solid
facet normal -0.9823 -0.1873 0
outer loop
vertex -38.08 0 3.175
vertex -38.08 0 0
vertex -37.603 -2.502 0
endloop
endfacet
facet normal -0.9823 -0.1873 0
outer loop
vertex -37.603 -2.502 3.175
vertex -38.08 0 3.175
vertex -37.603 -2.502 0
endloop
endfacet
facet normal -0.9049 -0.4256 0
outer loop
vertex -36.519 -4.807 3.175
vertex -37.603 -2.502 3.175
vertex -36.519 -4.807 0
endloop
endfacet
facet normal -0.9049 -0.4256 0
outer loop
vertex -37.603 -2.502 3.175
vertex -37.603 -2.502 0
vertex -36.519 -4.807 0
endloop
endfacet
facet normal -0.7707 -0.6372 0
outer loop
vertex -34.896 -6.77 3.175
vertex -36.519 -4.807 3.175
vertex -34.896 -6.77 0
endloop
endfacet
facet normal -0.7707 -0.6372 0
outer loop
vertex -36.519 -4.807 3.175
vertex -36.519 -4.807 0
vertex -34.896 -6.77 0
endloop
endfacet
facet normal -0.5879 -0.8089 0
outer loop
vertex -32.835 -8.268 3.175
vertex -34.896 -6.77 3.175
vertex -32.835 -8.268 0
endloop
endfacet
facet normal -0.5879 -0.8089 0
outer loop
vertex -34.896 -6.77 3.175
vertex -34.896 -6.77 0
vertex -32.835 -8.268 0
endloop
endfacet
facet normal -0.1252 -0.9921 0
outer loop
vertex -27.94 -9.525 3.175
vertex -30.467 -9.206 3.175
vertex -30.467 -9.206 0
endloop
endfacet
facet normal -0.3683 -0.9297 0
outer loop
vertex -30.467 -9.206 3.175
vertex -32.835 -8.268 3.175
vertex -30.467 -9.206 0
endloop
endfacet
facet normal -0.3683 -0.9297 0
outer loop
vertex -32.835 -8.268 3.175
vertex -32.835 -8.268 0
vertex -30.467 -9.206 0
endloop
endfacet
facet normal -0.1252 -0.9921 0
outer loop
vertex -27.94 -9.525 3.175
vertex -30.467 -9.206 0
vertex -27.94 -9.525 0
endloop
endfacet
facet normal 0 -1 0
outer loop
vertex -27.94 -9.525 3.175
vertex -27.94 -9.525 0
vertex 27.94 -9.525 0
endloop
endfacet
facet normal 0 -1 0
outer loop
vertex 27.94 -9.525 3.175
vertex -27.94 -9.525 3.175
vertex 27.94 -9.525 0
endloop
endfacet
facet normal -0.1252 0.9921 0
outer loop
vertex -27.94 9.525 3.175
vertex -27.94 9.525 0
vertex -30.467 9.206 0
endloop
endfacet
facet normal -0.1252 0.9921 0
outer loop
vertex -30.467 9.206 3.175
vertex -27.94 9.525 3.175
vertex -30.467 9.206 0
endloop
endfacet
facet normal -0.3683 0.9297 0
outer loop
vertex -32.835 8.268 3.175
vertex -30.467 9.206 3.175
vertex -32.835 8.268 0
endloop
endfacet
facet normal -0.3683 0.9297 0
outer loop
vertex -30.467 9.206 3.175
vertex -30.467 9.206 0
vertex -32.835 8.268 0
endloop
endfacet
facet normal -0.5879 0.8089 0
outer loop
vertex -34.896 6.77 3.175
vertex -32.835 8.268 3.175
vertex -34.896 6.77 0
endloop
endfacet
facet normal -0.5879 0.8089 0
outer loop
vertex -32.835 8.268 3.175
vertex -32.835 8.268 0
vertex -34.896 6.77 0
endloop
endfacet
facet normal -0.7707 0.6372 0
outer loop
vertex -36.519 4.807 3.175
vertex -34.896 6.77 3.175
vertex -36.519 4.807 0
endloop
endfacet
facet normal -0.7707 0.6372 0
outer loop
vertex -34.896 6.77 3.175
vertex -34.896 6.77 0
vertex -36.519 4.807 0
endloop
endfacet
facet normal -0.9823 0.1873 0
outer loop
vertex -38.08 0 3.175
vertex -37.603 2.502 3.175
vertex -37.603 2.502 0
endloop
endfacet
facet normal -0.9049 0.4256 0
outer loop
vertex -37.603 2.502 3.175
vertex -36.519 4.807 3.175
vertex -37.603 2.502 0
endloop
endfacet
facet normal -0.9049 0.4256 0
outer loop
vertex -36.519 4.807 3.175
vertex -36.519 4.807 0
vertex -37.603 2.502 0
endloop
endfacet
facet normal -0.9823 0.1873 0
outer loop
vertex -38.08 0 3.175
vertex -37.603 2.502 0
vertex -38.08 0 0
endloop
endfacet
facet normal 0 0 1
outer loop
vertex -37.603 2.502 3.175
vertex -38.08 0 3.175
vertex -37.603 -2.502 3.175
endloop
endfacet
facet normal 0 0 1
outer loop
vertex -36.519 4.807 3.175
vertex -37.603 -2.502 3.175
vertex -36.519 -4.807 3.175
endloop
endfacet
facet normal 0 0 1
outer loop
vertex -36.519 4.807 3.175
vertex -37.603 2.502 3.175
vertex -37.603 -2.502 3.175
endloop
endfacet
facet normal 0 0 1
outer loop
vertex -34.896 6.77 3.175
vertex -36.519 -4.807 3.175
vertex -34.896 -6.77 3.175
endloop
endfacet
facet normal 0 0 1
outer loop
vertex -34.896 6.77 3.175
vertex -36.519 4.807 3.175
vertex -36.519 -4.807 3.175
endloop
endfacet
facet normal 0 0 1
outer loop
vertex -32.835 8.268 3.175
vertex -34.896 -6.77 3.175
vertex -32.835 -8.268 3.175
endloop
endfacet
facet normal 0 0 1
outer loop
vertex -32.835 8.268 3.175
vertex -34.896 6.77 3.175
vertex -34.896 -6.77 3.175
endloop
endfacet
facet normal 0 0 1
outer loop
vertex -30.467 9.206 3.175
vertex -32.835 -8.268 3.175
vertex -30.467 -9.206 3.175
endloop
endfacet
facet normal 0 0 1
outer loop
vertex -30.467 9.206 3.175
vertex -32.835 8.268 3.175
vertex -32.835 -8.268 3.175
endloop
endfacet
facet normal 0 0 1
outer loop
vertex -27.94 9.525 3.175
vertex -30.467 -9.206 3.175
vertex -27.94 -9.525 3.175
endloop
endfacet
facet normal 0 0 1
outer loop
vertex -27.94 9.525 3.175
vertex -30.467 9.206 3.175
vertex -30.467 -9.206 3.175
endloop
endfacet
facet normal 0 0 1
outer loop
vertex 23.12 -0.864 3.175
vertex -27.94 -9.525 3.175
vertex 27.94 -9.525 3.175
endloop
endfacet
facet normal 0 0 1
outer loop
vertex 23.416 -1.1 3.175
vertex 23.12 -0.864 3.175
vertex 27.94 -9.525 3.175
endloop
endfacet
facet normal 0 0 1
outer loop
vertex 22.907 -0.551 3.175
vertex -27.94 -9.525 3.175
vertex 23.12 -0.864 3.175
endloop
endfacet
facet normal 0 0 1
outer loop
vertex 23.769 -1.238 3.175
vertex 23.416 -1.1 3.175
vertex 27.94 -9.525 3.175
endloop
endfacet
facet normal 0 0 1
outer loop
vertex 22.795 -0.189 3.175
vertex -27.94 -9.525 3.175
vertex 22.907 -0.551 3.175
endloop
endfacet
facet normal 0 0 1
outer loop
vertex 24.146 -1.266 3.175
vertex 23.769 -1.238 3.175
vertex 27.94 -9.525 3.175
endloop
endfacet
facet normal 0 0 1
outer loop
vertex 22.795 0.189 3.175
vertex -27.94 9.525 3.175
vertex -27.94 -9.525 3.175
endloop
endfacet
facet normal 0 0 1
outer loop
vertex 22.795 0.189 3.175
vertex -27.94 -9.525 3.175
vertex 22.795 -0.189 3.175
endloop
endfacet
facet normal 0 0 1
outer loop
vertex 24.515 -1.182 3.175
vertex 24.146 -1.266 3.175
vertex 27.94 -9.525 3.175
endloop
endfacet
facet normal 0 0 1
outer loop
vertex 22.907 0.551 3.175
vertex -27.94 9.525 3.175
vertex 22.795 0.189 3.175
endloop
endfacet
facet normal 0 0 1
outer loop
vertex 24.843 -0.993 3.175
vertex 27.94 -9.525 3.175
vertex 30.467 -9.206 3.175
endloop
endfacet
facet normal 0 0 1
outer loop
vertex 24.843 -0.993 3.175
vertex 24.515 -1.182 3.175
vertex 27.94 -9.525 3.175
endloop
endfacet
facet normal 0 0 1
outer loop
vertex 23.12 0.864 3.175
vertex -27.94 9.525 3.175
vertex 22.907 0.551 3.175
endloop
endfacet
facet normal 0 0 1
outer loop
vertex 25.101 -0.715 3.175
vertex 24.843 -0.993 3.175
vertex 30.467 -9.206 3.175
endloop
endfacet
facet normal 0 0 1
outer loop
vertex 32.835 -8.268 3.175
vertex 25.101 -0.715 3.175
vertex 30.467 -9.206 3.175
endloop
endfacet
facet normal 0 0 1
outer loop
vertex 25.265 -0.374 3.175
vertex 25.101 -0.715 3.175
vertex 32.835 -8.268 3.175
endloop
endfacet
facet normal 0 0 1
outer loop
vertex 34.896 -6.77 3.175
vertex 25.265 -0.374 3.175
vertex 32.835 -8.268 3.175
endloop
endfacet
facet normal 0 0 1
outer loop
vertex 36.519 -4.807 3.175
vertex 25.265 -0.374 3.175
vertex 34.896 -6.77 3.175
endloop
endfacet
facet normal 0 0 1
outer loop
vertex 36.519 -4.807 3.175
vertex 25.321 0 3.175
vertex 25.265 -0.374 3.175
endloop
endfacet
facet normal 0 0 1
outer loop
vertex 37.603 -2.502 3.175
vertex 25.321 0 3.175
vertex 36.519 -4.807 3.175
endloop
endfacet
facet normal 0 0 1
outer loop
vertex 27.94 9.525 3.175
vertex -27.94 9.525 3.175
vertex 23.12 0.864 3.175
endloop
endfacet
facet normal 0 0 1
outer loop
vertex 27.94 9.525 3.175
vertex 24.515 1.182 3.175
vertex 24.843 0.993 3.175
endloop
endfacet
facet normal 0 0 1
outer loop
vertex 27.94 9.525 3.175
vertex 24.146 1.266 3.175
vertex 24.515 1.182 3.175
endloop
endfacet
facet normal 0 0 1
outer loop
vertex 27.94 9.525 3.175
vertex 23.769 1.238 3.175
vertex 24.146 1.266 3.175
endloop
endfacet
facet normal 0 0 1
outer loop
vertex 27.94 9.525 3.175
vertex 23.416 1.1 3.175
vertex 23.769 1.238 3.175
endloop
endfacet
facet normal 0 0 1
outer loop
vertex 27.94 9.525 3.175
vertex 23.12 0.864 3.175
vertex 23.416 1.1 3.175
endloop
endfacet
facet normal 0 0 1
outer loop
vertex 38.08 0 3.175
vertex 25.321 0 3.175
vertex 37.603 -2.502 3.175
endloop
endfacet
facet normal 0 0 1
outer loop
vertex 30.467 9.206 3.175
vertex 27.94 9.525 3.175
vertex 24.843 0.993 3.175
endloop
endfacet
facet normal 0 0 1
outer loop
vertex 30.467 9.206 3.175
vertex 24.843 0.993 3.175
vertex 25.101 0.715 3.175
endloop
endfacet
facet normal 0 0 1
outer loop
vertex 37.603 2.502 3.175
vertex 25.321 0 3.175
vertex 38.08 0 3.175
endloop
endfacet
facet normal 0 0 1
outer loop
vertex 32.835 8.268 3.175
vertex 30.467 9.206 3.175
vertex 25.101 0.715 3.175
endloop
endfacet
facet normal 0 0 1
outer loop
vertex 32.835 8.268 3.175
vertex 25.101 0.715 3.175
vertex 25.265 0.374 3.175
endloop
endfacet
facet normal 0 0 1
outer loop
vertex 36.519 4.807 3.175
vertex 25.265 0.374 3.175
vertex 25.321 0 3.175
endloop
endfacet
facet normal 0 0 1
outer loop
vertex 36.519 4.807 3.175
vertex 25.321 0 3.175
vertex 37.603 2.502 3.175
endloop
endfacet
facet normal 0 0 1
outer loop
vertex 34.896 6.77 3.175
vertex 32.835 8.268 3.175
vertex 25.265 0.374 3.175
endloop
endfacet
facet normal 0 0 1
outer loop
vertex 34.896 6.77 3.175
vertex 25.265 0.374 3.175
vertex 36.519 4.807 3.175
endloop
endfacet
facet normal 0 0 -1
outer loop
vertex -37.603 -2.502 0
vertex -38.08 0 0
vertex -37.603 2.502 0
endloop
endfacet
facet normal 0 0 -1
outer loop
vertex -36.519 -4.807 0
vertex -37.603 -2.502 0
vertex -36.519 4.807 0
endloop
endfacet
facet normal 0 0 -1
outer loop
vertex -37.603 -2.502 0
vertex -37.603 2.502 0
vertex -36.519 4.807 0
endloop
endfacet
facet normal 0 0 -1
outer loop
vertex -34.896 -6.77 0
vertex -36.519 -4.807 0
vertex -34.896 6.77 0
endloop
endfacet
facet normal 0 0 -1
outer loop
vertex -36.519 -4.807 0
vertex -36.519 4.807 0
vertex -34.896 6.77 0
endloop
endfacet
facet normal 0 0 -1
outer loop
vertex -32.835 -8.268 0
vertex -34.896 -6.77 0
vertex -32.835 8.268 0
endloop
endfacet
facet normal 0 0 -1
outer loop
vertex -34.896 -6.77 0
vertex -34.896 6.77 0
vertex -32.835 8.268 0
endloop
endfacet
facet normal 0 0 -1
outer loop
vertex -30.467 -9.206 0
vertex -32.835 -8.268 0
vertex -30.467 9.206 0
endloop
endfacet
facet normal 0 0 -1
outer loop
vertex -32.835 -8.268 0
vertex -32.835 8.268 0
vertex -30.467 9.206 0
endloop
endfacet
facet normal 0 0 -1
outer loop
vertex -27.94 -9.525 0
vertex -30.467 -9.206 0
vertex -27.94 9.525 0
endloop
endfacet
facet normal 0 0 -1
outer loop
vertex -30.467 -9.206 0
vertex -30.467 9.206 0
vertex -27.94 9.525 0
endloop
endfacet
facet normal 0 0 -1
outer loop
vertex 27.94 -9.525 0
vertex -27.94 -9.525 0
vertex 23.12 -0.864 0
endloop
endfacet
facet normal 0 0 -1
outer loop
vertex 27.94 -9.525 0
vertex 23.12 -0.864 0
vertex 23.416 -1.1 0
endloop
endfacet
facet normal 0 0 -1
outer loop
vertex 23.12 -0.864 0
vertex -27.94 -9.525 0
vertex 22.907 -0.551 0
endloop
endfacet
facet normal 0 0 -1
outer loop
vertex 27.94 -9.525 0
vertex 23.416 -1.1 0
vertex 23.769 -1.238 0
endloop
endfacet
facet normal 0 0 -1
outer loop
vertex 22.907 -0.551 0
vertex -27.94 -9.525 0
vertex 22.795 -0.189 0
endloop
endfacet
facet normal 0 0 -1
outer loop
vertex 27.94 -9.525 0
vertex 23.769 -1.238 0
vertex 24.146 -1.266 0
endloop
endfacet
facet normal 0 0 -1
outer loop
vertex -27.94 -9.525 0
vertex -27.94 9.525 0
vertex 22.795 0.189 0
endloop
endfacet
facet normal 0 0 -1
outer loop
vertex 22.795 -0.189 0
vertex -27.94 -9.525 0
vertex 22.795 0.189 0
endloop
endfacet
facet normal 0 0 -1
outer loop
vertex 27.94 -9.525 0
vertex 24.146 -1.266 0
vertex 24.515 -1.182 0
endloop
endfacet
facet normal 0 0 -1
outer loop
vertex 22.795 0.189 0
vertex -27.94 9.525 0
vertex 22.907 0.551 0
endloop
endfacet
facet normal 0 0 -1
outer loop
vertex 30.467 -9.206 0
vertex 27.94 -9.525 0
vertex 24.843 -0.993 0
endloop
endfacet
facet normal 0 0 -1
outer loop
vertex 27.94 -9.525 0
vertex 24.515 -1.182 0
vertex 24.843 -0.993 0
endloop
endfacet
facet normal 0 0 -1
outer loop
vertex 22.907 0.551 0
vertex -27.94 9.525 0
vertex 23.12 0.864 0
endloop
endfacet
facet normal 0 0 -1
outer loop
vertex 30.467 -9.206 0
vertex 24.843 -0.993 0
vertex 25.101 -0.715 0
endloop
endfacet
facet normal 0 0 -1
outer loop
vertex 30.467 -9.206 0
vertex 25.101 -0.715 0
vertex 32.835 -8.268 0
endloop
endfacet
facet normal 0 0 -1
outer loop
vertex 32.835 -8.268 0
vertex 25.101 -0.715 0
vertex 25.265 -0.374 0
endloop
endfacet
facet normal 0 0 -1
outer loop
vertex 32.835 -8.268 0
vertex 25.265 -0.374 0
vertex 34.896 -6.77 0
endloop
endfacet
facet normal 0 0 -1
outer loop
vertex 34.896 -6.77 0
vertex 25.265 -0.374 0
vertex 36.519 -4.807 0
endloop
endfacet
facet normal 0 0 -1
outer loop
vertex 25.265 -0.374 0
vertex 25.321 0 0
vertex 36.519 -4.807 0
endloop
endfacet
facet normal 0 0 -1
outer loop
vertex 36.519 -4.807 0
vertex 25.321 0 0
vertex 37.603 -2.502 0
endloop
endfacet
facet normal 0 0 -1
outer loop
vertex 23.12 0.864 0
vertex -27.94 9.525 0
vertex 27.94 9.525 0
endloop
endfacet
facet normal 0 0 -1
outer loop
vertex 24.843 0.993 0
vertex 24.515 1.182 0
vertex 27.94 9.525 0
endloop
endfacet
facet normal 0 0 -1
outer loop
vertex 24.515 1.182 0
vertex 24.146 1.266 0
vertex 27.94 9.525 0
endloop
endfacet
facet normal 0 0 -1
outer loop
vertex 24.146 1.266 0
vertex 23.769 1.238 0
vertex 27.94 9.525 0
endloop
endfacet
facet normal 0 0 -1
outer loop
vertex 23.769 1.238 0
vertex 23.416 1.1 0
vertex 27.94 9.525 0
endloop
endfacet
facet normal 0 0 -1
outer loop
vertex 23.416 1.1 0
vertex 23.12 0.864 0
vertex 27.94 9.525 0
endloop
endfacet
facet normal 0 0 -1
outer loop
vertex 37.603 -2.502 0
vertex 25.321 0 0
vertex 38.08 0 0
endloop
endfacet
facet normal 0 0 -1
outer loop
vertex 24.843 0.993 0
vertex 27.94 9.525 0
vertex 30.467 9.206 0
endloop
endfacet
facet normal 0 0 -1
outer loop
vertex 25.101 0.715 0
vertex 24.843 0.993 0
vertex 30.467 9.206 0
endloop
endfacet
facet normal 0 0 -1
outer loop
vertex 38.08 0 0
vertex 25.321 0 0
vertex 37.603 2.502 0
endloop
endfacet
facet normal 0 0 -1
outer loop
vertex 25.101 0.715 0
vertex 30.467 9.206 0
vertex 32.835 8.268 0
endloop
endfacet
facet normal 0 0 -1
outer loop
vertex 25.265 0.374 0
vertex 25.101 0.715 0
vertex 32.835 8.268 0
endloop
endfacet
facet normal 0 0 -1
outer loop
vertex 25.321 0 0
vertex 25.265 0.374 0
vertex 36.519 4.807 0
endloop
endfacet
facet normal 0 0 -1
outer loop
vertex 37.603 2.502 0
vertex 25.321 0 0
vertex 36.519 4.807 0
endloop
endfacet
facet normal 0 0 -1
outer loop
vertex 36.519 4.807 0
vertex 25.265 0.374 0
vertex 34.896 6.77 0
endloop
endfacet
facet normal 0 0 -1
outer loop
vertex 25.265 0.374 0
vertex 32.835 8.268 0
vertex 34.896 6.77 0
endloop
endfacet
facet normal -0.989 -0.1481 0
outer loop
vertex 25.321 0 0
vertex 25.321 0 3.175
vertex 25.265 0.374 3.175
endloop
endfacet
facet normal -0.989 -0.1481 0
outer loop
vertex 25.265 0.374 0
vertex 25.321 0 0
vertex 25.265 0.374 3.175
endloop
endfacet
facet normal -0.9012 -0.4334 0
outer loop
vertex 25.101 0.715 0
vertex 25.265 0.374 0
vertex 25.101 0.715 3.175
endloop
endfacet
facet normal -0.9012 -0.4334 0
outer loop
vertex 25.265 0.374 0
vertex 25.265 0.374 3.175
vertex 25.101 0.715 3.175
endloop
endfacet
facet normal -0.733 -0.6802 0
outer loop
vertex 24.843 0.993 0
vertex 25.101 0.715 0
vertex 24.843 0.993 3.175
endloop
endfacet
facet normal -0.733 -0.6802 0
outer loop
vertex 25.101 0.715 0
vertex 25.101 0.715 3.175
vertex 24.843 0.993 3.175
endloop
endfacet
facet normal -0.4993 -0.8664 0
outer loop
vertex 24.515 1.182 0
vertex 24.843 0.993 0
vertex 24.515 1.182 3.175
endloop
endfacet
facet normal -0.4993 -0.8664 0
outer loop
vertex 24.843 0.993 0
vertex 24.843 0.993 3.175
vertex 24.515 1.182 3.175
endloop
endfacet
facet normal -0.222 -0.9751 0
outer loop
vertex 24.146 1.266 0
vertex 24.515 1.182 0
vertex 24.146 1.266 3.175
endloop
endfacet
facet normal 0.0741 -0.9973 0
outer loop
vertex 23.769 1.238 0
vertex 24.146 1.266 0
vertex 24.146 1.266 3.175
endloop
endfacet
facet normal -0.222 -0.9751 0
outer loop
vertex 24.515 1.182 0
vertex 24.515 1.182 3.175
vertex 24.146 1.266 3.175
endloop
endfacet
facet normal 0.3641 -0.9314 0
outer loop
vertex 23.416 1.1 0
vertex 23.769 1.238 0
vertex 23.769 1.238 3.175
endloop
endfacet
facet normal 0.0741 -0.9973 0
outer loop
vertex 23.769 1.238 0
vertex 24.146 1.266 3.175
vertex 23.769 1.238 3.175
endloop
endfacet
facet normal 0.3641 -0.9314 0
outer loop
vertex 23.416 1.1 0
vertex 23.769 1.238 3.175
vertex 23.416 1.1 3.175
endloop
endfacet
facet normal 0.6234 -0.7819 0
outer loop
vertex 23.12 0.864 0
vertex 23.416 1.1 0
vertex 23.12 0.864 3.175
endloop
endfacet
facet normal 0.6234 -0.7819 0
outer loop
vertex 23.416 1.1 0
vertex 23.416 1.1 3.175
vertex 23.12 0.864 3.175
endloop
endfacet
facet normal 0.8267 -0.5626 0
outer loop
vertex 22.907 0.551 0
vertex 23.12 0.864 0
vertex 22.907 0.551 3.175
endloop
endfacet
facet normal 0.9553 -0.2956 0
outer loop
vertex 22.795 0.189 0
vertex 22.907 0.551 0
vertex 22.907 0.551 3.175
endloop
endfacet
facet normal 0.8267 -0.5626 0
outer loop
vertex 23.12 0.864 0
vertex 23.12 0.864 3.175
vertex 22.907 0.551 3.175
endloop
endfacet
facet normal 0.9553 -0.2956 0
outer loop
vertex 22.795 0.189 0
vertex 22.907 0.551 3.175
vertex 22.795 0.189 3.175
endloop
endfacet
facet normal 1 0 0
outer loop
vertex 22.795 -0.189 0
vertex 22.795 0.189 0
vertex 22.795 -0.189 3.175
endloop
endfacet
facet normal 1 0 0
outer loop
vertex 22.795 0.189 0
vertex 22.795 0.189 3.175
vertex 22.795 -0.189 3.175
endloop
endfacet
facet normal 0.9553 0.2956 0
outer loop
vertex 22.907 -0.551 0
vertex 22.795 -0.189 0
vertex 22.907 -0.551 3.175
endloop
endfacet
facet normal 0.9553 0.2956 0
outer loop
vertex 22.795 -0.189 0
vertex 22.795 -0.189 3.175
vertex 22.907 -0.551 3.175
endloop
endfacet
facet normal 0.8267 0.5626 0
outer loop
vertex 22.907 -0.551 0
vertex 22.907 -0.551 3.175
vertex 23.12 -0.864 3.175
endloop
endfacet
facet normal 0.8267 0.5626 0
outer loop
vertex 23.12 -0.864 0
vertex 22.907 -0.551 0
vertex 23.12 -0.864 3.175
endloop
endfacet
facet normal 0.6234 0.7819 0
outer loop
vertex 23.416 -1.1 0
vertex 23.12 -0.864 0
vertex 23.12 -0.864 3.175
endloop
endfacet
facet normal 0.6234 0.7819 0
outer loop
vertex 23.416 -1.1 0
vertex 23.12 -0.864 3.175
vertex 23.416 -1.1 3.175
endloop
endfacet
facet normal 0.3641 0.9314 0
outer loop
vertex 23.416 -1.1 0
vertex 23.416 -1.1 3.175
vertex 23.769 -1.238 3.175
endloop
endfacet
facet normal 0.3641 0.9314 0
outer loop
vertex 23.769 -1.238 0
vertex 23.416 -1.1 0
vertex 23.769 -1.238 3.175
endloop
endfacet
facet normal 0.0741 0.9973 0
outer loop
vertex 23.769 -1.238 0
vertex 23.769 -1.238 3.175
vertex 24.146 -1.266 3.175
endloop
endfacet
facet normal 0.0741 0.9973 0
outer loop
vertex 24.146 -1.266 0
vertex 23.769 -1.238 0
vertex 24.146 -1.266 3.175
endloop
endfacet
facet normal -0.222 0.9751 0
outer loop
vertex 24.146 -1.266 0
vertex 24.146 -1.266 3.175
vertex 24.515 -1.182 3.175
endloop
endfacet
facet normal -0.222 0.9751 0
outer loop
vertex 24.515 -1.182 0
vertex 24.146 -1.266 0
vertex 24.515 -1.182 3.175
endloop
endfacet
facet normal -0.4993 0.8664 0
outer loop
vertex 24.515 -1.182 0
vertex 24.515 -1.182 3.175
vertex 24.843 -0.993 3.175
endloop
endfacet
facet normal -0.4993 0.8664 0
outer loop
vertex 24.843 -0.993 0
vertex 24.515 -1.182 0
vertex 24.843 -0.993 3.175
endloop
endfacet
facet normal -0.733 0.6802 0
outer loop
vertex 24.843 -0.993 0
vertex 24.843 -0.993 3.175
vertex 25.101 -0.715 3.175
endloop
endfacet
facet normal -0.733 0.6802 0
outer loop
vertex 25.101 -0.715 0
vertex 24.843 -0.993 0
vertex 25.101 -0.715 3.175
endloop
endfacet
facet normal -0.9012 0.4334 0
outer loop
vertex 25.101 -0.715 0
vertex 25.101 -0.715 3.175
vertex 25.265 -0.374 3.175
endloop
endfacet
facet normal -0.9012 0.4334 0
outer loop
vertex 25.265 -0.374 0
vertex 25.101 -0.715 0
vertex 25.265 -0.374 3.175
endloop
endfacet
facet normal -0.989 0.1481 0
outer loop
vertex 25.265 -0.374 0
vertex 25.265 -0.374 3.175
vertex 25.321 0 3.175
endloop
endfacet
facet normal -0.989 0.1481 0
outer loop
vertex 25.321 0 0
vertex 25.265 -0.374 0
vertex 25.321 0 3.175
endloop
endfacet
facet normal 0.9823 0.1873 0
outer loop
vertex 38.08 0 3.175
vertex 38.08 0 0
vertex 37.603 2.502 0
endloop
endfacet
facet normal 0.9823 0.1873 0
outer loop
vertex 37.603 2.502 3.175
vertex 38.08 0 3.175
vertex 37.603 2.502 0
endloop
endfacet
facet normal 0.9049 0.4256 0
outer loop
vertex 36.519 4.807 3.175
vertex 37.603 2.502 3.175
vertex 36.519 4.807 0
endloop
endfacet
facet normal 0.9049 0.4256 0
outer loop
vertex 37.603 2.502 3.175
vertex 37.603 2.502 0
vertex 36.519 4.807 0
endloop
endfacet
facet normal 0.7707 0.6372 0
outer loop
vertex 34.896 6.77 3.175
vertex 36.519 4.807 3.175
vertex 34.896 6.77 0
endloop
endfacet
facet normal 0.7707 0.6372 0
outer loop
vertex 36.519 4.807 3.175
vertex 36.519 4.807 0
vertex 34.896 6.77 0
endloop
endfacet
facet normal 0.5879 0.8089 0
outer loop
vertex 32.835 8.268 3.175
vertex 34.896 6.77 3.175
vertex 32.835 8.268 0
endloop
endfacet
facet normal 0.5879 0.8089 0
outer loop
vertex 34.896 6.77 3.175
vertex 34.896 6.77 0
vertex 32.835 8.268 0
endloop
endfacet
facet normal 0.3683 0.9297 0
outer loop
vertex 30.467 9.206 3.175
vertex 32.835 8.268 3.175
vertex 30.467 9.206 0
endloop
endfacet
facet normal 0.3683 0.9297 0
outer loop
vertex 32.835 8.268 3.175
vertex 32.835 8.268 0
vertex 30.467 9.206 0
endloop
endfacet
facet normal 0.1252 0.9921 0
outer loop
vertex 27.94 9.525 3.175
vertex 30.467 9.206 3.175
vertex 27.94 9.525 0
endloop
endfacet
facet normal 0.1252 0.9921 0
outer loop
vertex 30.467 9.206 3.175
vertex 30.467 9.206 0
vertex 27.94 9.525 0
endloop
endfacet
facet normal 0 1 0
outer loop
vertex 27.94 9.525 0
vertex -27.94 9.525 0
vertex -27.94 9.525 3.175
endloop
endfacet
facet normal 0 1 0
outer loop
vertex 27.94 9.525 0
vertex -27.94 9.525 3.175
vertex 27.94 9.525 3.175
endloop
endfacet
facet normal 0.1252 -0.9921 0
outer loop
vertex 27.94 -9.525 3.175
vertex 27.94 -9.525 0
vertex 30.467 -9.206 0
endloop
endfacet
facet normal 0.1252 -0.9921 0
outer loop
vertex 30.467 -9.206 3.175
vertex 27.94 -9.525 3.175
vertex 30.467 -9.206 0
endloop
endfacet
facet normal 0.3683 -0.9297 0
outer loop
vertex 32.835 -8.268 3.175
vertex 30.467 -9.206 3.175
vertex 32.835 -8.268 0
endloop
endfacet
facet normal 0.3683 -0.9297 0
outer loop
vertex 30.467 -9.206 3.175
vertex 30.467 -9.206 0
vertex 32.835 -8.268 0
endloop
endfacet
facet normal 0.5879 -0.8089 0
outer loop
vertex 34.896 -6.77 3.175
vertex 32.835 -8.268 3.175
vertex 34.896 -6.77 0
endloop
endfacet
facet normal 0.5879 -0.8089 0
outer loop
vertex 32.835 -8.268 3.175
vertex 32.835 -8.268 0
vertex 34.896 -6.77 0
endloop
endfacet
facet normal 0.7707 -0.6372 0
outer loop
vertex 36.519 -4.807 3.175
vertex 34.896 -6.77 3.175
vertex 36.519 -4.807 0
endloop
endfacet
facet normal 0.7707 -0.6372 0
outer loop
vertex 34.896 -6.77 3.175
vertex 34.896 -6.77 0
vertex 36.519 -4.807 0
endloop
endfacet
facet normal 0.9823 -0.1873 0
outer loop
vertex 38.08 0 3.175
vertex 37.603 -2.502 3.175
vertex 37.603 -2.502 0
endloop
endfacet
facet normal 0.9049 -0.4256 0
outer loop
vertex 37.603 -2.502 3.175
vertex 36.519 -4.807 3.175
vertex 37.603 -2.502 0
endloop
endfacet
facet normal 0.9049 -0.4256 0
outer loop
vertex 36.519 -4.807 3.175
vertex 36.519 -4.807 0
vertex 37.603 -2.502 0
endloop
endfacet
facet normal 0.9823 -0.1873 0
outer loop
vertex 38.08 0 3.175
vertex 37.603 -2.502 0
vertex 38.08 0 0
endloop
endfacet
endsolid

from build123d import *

# Parameters (mm, degrees)
SKETCH1_W           = 76.2
SKETCH1_H           = 19.05
BOSS_EXTRUDE1_DEPTH = 3.175
SKETCH2_R           = 1.27
CUT_EXTRUDE1_DEPTH  = 40.400713826
FILLET1_R           = 10.16


with BuildPart() as part:
    # Sketch1 → Boss-Extrude1 (new body)
    with BuildSketch(Plane.XY):
        Rectangle(SKETCH1_W, SKETCH1_H)
    extrude(amount=BOSS_EXTRUDE1_DEPTH)

    # Sketch2 → Cut-Extrude1 (cut, through all)
    with BuildSketch(Plane.XY.offset(3.175)):
        with Locations((24.051290482, 0)):
            Circle(SKETCH2_R)
    extrude(amount=-CUT_EXTRUDE1_DEPTH, mode=Mode.SUBTRACT)

    # Fillet1
    # the kernel refuses this fillet: 10.16 mm, written as the material it takes off along each edge
    with BuildSketch(Plane(origin=(-38.1, -9.525, -25.4), x_dir=(1, 0, 0), z_dir=(0, 0, 1)), Plane(origin=(-38.1, 9.525, -25.4), x_dir=(0, -1, 0), z_dir=(0, 0, 1))) as fillet1_piece_1:
        with BuildLine():
            CenterArc((FILLET1_R, FILLET1_R), FILLET1_R, 180, 90)
            Line((0, FILLET1_R), (0, 0))
            Line((0, 0), (FILLET1_R, 0))
        make_face()
    extrude(amount=53.975, mode=Mode.SUBTRACT)
    with BuildSketch(Plane(origin=(38.1, -9.525, -25.4), x_dir=(-1, 0, 0), z_dir=(0, 0, 1)), Plane(origin=(38.1, 9.525, -25.4), x_dir=(0, -1, 0), z_dir=(0, 0, 1))) as fillet1_piece_2:
        with BuildLine():
            CenterArc((FILLET1_R, -FILLET1_R), FILLET1_R, 90, 90)
            Line((0, -FILLET1_R), (0, 0))
            Line((0, 0), (FILLET1_R, 0))
        make_face()
    extrude(amount=53.975, mode=Mode.SUBTRACT)


solid = part.part
